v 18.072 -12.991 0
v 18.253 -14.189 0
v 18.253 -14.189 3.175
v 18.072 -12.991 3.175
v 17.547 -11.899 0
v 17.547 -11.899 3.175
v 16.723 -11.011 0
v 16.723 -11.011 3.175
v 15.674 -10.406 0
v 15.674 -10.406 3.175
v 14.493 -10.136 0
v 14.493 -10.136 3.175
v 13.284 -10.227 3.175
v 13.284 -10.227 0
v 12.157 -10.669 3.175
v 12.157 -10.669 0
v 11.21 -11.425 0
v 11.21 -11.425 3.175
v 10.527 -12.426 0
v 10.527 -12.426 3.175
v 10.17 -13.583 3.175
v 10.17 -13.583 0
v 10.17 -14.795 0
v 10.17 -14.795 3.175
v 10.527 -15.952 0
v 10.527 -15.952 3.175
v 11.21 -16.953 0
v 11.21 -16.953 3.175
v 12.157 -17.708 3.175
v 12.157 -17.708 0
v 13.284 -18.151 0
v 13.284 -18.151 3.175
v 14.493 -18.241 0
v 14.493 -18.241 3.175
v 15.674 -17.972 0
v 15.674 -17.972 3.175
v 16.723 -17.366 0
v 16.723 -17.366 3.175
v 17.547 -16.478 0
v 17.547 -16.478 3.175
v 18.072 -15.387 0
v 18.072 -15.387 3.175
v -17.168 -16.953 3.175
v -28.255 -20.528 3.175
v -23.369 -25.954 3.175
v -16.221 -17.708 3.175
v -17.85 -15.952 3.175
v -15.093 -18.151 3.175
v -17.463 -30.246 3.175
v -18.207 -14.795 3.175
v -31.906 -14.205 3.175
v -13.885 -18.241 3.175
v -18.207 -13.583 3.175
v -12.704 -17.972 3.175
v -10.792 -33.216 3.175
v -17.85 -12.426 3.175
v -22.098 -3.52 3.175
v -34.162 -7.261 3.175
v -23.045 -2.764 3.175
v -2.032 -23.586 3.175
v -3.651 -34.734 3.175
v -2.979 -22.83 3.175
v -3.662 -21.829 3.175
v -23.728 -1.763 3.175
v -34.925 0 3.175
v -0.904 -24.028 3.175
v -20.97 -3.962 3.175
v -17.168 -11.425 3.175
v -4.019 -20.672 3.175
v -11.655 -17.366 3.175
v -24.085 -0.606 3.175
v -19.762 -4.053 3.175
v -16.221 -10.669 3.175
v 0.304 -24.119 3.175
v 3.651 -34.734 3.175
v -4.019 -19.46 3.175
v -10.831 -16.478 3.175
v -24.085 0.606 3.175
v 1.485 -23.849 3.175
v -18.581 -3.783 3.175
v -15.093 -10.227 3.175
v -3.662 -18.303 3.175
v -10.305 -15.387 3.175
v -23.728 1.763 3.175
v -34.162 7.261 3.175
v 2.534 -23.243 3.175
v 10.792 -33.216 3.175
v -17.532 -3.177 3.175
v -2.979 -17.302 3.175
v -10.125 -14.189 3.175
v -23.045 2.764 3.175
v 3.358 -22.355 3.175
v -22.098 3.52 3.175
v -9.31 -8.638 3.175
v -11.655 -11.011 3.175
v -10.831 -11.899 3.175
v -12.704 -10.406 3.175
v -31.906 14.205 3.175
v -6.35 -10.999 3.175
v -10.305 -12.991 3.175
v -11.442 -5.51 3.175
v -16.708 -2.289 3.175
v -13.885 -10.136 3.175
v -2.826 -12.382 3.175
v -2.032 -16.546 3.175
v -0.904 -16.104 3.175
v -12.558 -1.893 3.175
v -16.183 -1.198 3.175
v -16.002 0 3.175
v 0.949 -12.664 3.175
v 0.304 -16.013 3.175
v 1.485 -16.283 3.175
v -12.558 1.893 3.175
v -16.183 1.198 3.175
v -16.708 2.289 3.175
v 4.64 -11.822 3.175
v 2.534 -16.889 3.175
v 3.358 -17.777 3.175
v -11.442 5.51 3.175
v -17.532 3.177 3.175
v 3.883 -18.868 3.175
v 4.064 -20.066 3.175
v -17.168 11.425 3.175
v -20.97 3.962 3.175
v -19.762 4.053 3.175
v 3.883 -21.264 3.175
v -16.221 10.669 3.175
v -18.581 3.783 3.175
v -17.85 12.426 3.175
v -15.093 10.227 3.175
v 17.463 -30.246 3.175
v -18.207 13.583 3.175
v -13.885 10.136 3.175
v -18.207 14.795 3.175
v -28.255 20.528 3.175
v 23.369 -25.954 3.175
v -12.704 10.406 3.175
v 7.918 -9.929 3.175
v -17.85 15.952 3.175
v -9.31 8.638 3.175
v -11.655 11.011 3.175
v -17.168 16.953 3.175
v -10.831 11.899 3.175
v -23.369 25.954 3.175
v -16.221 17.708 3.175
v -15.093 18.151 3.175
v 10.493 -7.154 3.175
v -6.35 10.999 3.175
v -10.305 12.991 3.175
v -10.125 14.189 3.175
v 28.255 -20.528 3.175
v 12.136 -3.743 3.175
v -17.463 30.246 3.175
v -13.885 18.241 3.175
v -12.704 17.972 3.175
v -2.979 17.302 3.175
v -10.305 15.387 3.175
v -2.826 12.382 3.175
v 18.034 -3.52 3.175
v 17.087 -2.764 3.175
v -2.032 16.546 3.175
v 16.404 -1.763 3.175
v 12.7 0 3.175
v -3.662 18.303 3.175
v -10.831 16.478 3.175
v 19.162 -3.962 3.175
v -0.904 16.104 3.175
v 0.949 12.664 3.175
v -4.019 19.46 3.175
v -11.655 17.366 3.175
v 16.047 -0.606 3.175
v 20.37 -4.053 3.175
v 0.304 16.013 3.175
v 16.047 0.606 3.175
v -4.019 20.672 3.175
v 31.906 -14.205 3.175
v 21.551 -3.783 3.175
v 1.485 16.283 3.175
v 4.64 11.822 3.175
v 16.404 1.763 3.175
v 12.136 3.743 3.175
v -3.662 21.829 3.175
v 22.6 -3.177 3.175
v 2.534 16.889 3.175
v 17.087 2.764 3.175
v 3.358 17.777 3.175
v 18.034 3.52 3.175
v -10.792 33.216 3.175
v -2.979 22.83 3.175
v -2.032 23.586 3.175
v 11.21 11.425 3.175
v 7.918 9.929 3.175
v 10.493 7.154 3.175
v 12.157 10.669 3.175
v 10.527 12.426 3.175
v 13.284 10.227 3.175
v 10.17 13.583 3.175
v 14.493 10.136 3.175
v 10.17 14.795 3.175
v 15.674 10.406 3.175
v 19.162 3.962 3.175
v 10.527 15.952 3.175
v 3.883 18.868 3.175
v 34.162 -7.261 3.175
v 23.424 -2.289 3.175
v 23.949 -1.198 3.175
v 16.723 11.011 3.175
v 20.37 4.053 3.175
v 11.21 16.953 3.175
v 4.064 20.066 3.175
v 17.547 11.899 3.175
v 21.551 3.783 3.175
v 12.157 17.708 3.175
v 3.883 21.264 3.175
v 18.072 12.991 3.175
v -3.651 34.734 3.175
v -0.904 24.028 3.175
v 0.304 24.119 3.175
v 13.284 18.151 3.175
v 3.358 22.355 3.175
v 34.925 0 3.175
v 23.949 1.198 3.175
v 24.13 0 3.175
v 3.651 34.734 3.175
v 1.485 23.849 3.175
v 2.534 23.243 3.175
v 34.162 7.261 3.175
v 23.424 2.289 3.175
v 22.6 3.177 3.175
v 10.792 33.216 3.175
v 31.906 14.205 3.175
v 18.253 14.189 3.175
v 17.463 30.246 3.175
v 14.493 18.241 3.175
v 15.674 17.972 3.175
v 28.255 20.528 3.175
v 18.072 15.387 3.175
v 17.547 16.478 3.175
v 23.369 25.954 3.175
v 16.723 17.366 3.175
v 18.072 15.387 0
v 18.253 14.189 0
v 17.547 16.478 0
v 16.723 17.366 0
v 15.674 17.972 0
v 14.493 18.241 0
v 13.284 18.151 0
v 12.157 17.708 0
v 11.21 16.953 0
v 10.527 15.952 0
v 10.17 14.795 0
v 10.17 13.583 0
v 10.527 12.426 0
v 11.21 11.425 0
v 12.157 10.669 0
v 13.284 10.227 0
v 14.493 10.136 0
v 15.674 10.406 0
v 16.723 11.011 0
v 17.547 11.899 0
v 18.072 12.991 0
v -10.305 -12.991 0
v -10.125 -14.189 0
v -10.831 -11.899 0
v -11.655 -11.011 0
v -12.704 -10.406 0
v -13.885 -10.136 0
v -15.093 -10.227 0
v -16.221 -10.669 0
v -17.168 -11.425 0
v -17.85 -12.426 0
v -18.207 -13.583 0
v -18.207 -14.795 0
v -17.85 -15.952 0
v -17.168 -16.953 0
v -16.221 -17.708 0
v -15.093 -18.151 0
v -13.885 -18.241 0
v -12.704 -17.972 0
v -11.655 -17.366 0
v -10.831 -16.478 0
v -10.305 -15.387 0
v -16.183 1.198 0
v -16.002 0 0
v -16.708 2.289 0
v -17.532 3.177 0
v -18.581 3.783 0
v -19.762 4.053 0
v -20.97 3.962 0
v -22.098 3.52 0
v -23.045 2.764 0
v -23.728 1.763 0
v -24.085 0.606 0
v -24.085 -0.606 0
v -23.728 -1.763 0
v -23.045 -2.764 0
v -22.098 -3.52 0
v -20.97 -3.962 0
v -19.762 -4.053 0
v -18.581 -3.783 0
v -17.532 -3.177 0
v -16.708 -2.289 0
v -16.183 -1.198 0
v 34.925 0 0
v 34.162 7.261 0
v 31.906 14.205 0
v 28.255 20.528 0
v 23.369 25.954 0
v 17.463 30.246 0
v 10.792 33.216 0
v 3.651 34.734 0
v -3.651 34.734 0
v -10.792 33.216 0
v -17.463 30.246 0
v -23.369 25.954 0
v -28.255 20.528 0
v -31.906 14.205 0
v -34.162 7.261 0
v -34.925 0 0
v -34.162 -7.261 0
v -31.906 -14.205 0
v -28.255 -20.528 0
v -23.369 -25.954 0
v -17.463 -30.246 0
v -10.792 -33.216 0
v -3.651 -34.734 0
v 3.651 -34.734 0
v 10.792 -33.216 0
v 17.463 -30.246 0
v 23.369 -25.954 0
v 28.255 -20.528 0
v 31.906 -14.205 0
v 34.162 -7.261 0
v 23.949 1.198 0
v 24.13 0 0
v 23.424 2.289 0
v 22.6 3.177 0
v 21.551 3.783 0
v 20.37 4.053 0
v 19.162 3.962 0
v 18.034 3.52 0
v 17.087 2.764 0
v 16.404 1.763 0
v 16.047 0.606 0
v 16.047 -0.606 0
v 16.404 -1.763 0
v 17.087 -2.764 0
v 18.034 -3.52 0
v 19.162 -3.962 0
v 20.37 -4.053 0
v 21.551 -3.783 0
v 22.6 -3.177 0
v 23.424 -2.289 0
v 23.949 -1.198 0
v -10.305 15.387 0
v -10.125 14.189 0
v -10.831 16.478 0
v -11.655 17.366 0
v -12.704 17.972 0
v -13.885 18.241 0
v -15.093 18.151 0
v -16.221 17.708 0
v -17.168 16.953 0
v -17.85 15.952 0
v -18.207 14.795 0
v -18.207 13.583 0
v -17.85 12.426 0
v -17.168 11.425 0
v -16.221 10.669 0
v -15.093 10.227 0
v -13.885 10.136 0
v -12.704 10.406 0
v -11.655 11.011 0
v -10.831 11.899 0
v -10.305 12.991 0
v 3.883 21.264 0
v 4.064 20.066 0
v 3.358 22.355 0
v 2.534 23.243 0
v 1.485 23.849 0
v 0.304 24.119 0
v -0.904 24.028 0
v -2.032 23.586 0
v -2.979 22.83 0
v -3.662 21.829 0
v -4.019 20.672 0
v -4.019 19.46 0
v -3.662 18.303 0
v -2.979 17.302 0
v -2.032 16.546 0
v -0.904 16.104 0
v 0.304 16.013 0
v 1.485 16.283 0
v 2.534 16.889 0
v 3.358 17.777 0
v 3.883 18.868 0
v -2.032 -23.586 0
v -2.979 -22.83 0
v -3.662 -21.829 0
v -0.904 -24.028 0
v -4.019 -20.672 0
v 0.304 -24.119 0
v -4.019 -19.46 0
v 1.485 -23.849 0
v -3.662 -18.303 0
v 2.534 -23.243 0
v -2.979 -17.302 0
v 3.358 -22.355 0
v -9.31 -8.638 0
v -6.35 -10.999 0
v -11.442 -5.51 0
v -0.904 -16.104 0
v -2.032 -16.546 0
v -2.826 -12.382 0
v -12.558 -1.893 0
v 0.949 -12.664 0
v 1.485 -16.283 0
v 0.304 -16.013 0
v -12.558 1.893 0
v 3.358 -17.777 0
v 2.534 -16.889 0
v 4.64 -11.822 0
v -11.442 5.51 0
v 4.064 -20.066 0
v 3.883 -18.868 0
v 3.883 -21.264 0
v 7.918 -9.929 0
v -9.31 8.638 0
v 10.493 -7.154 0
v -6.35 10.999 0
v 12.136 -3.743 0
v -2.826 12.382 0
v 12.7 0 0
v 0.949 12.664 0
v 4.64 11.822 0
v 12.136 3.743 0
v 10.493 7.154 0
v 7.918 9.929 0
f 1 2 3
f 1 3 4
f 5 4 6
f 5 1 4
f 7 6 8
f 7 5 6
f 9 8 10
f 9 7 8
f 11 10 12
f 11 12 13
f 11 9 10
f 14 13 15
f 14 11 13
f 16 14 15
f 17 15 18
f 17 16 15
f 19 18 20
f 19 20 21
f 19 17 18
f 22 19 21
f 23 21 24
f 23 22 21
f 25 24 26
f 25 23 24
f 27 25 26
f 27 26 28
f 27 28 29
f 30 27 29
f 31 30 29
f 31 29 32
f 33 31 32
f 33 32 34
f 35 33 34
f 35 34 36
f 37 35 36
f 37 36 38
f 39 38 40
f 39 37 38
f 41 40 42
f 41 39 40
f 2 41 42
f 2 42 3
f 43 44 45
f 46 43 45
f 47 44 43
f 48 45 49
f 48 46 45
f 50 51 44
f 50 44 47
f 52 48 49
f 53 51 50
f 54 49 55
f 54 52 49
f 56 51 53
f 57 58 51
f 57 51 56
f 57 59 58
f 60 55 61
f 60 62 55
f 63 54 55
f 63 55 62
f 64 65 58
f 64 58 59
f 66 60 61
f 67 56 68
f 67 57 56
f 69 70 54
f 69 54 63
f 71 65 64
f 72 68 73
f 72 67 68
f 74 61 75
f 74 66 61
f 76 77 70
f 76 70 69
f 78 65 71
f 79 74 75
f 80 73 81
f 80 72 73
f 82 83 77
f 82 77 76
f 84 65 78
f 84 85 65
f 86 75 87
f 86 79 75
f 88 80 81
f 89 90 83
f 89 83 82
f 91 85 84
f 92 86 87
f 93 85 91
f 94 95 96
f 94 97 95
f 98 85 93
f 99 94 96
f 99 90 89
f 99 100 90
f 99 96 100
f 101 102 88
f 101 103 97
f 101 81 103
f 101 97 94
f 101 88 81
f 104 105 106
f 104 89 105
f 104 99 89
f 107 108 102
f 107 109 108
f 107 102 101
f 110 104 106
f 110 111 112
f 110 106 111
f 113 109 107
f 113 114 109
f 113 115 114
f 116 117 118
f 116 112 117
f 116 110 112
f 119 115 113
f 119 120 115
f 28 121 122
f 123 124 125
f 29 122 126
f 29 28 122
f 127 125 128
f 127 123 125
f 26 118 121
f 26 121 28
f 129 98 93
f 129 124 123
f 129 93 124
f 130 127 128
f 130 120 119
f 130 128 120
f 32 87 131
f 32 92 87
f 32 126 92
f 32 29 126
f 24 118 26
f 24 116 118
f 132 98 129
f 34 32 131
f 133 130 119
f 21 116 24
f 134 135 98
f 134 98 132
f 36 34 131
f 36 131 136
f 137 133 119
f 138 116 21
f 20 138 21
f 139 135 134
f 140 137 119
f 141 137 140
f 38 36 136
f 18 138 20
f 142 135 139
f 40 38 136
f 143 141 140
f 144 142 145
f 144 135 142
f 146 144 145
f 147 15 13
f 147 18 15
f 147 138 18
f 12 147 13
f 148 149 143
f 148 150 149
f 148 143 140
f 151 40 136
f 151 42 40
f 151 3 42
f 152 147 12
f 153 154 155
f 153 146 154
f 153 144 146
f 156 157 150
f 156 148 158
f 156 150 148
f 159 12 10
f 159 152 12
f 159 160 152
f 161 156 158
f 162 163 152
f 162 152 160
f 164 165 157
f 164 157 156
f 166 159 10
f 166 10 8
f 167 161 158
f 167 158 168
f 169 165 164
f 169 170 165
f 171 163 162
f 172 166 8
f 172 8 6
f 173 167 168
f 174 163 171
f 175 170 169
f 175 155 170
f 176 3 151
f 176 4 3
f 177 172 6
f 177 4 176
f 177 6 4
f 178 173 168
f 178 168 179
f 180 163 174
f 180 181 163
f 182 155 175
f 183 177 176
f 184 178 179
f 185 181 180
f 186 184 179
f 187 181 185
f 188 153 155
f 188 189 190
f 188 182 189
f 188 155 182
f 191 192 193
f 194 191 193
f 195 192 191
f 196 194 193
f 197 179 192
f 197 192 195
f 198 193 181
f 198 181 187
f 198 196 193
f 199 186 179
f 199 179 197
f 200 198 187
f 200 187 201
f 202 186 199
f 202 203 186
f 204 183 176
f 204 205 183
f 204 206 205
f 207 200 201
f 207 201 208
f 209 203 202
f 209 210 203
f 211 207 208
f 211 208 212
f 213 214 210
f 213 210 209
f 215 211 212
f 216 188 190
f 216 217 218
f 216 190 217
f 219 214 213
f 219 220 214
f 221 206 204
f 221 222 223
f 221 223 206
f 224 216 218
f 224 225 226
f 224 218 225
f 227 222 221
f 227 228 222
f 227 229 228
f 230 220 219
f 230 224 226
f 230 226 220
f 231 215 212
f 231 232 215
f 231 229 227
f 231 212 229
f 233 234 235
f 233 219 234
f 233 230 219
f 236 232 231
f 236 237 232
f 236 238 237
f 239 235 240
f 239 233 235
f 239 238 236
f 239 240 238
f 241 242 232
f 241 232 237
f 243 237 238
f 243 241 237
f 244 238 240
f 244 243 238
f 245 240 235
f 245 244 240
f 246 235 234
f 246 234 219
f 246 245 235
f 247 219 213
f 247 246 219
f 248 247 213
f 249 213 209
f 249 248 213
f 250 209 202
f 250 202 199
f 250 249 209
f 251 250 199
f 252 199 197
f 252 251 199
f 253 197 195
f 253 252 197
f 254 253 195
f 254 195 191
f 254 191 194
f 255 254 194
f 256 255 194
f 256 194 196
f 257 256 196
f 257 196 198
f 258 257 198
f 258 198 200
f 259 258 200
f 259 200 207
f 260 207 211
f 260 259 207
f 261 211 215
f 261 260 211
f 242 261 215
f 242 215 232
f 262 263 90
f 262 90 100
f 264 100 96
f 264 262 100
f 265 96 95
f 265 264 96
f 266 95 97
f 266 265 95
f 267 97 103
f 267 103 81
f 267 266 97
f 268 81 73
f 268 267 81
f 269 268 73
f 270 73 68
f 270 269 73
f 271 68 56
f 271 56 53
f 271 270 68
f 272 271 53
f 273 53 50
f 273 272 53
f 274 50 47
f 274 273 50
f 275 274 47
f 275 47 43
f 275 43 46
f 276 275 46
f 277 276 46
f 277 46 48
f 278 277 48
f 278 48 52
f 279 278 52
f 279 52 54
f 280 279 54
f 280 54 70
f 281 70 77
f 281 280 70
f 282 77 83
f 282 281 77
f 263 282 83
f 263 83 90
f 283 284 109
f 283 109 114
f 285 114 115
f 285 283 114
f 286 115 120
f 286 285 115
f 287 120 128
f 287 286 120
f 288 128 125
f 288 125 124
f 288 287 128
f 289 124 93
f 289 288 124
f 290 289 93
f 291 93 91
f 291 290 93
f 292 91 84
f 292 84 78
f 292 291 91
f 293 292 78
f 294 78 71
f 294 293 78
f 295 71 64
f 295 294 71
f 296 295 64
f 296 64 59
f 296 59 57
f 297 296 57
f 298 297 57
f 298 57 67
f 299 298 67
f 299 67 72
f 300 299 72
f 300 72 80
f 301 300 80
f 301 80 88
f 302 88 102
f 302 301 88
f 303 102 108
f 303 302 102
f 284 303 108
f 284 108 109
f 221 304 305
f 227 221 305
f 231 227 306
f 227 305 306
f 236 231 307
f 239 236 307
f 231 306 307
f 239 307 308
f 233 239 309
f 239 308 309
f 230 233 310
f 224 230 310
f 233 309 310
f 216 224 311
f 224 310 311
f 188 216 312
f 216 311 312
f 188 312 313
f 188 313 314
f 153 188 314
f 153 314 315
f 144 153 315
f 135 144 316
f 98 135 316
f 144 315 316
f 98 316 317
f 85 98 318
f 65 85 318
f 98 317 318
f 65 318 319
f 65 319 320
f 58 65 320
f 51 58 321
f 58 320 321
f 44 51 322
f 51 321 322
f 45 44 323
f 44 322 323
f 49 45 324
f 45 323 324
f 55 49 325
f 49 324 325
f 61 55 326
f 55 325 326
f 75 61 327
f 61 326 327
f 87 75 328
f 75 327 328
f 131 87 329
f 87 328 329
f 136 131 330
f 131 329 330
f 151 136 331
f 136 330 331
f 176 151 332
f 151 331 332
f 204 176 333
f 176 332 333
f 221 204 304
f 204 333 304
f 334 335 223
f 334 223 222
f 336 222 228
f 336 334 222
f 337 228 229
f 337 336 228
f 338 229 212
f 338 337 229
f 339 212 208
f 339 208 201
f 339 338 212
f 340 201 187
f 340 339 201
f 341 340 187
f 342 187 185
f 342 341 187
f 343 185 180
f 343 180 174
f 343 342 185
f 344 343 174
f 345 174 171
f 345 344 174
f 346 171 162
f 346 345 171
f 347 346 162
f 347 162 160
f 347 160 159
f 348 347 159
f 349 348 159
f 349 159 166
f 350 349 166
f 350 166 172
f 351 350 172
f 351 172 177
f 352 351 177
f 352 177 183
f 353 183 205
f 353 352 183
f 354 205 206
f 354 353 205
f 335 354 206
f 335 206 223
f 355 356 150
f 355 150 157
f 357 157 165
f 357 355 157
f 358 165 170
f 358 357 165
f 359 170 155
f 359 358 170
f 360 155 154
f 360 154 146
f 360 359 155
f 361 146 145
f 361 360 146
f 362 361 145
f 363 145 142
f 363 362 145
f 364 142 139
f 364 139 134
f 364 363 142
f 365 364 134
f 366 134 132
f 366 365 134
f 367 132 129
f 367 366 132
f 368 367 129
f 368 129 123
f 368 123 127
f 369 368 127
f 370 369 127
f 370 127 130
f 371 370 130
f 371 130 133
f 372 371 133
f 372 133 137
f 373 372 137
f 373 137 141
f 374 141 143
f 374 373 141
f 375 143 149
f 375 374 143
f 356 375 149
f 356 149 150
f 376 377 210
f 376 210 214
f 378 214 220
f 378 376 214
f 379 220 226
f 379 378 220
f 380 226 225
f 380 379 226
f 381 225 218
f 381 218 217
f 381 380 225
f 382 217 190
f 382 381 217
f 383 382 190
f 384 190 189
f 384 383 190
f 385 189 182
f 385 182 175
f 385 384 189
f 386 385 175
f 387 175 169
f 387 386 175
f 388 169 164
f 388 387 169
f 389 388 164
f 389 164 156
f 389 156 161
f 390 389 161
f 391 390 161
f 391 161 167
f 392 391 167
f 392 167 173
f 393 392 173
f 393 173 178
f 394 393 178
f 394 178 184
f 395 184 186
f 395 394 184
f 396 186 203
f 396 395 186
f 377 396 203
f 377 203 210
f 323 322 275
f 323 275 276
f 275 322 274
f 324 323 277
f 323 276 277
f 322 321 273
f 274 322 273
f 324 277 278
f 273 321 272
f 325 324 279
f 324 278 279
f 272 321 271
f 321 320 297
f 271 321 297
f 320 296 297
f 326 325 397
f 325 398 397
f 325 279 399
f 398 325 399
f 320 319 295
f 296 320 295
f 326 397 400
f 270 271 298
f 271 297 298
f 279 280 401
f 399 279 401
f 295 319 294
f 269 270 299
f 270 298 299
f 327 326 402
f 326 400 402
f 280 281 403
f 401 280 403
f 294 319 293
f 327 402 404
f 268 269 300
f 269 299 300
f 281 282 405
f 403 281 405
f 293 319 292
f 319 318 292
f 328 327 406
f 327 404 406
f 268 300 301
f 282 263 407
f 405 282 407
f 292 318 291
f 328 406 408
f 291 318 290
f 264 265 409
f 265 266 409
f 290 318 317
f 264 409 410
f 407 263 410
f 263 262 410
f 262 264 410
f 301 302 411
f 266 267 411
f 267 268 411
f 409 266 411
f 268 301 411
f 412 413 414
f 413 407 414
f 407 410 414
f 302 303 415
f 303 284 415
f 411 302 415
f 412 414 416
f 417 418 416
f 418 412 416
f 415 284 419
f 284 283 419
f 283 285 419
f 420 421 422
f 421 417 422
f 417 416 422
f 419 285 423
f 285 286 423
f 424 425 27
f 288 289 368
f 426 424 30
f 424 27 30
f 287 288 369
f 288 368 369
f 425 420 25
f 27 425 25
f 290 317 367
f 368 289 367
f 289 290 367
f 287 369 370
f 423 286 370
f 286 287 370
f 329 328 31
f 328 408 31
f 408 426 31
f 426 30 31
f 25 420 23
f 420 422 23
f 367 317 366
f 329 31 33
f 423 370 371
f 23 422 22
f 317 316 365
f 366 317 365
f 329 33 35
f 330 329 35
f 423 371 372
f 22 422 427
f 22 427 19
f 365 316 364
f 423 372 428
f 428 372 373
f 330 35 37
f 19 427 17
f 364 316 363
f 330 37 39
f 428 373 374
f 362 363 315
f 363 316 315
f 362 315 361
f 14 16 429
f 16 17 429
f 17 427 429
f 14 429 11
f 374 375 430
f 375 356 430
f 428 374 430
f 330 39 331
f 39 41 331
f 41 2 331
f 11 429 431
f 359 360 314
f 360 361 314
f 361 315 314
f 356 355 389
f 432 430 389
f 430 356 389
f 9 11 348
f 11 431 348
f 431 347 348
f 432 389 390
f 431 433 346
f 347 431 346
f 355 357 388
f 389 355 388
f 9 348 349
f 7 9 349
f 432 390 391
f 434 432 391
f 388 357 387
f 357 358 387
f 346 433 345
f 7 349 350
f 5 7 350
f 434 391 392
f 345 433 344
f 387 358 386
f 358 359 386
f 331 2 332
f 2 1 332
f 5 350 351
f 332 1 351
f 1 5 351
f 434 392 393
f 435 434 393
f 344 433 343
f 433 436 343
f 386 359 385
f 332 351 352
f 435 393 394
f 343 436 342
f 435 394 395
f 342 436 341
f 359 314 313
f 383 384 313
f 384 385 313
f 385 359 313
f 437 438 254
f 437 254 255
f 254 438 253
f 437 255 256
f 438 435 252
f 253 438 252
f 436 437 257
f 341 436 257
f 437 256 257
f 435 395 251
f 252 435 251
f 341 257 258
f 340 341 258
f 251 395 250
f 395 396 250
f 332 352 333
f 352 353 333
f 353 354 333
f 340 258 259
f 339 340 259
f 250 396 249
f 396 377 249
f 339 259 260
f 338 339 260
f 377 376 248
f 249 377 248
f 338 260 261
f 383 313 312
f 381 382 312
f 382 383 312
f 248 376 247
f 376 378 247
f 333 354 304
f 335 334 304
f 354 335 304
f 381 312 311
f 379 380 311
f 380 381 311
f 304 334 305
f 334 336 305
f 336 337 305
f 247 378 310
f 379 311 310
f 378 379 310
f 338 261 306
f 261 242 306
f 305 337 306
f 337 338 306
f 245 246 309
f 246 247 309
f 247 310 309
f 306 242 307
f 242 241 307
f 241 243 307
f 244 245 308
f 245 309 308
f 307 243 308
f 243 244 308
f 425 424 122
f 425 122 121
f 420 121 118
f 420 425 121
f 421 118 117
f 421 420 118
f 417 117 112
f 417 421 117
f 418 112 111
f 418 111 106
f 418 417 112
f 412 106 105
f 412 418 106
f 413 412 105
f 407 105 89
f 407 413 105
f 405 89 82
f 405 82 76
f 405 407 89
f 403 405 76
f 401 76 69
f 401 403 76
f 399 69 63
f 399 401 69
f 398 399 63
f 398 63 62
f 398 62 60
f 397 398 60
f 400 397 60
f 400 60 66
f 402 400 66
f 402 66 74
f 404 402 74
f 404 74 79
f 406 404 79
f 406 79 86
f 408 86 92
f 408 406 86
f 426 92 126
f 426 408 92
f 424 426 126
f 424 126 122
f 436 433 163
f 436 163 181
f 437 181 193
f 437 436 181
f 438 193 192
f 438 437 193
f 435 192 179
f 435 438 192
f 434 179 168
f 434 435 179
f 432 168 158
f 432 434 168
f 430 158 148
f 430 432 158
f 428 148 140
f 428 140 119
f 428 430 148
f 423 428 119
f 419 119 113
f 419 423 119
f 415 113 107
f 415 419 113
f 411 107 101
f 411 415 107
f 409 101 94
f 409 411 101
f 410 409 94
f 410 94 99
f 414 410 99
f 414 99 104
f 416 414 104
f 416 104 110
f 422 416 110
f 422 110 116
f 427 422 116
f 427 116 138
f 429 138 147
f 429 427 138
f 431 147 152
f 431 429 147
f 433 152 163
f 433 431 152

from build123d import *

# Parameters (mm, degrees)
F0_R     = 34.925
F0_R_2   = 4.064
F0_R_3   = 12.7
F1_DEPTH = 3.175


with BuildPart() as f1:
    # F0 (on Top) → F1 (new body)
    with BuildSketch(Plane.XY):
        Circle(F0_R)
        with Locations((-14.188805, -14.188805)):
            Circle(F0_R_2, mode=Mode.SUBTRACT)
        with Locations((0, -20.066)):
            Circle(F0_R_2, mode=Mode.SUBTRACT)
        with Locations((14.188805, -14.188805)):
            Circle(F0_R_2, mode=Mode.SUBTRACT)
        with Locations((-20.066, 0)):
            Circle(F0_R_2, mode=Mode.SUBTRACT)
        with Locations((-14.188805, 14.188805)):
            Circle(F0_R_2, mode=Mode.SUBTRACT)
        Circle(F0_R_3, mode=Mode.SUBTRACT)
        with Locations((14.188805, 14.188805)):
            Circle(F0_R_2, mode=Mode.SUBTRACT)
        with Locations((20.066, 0)):
            Circle(F0_R_2, mode=Mode.SUBTRACT)
        with Locations((0, 20.066)):
            Circle(F0_R_2, mode=Mode.SUBTRACT)
    extrude(amount=F1_DEPTH)


solid = f1.part
